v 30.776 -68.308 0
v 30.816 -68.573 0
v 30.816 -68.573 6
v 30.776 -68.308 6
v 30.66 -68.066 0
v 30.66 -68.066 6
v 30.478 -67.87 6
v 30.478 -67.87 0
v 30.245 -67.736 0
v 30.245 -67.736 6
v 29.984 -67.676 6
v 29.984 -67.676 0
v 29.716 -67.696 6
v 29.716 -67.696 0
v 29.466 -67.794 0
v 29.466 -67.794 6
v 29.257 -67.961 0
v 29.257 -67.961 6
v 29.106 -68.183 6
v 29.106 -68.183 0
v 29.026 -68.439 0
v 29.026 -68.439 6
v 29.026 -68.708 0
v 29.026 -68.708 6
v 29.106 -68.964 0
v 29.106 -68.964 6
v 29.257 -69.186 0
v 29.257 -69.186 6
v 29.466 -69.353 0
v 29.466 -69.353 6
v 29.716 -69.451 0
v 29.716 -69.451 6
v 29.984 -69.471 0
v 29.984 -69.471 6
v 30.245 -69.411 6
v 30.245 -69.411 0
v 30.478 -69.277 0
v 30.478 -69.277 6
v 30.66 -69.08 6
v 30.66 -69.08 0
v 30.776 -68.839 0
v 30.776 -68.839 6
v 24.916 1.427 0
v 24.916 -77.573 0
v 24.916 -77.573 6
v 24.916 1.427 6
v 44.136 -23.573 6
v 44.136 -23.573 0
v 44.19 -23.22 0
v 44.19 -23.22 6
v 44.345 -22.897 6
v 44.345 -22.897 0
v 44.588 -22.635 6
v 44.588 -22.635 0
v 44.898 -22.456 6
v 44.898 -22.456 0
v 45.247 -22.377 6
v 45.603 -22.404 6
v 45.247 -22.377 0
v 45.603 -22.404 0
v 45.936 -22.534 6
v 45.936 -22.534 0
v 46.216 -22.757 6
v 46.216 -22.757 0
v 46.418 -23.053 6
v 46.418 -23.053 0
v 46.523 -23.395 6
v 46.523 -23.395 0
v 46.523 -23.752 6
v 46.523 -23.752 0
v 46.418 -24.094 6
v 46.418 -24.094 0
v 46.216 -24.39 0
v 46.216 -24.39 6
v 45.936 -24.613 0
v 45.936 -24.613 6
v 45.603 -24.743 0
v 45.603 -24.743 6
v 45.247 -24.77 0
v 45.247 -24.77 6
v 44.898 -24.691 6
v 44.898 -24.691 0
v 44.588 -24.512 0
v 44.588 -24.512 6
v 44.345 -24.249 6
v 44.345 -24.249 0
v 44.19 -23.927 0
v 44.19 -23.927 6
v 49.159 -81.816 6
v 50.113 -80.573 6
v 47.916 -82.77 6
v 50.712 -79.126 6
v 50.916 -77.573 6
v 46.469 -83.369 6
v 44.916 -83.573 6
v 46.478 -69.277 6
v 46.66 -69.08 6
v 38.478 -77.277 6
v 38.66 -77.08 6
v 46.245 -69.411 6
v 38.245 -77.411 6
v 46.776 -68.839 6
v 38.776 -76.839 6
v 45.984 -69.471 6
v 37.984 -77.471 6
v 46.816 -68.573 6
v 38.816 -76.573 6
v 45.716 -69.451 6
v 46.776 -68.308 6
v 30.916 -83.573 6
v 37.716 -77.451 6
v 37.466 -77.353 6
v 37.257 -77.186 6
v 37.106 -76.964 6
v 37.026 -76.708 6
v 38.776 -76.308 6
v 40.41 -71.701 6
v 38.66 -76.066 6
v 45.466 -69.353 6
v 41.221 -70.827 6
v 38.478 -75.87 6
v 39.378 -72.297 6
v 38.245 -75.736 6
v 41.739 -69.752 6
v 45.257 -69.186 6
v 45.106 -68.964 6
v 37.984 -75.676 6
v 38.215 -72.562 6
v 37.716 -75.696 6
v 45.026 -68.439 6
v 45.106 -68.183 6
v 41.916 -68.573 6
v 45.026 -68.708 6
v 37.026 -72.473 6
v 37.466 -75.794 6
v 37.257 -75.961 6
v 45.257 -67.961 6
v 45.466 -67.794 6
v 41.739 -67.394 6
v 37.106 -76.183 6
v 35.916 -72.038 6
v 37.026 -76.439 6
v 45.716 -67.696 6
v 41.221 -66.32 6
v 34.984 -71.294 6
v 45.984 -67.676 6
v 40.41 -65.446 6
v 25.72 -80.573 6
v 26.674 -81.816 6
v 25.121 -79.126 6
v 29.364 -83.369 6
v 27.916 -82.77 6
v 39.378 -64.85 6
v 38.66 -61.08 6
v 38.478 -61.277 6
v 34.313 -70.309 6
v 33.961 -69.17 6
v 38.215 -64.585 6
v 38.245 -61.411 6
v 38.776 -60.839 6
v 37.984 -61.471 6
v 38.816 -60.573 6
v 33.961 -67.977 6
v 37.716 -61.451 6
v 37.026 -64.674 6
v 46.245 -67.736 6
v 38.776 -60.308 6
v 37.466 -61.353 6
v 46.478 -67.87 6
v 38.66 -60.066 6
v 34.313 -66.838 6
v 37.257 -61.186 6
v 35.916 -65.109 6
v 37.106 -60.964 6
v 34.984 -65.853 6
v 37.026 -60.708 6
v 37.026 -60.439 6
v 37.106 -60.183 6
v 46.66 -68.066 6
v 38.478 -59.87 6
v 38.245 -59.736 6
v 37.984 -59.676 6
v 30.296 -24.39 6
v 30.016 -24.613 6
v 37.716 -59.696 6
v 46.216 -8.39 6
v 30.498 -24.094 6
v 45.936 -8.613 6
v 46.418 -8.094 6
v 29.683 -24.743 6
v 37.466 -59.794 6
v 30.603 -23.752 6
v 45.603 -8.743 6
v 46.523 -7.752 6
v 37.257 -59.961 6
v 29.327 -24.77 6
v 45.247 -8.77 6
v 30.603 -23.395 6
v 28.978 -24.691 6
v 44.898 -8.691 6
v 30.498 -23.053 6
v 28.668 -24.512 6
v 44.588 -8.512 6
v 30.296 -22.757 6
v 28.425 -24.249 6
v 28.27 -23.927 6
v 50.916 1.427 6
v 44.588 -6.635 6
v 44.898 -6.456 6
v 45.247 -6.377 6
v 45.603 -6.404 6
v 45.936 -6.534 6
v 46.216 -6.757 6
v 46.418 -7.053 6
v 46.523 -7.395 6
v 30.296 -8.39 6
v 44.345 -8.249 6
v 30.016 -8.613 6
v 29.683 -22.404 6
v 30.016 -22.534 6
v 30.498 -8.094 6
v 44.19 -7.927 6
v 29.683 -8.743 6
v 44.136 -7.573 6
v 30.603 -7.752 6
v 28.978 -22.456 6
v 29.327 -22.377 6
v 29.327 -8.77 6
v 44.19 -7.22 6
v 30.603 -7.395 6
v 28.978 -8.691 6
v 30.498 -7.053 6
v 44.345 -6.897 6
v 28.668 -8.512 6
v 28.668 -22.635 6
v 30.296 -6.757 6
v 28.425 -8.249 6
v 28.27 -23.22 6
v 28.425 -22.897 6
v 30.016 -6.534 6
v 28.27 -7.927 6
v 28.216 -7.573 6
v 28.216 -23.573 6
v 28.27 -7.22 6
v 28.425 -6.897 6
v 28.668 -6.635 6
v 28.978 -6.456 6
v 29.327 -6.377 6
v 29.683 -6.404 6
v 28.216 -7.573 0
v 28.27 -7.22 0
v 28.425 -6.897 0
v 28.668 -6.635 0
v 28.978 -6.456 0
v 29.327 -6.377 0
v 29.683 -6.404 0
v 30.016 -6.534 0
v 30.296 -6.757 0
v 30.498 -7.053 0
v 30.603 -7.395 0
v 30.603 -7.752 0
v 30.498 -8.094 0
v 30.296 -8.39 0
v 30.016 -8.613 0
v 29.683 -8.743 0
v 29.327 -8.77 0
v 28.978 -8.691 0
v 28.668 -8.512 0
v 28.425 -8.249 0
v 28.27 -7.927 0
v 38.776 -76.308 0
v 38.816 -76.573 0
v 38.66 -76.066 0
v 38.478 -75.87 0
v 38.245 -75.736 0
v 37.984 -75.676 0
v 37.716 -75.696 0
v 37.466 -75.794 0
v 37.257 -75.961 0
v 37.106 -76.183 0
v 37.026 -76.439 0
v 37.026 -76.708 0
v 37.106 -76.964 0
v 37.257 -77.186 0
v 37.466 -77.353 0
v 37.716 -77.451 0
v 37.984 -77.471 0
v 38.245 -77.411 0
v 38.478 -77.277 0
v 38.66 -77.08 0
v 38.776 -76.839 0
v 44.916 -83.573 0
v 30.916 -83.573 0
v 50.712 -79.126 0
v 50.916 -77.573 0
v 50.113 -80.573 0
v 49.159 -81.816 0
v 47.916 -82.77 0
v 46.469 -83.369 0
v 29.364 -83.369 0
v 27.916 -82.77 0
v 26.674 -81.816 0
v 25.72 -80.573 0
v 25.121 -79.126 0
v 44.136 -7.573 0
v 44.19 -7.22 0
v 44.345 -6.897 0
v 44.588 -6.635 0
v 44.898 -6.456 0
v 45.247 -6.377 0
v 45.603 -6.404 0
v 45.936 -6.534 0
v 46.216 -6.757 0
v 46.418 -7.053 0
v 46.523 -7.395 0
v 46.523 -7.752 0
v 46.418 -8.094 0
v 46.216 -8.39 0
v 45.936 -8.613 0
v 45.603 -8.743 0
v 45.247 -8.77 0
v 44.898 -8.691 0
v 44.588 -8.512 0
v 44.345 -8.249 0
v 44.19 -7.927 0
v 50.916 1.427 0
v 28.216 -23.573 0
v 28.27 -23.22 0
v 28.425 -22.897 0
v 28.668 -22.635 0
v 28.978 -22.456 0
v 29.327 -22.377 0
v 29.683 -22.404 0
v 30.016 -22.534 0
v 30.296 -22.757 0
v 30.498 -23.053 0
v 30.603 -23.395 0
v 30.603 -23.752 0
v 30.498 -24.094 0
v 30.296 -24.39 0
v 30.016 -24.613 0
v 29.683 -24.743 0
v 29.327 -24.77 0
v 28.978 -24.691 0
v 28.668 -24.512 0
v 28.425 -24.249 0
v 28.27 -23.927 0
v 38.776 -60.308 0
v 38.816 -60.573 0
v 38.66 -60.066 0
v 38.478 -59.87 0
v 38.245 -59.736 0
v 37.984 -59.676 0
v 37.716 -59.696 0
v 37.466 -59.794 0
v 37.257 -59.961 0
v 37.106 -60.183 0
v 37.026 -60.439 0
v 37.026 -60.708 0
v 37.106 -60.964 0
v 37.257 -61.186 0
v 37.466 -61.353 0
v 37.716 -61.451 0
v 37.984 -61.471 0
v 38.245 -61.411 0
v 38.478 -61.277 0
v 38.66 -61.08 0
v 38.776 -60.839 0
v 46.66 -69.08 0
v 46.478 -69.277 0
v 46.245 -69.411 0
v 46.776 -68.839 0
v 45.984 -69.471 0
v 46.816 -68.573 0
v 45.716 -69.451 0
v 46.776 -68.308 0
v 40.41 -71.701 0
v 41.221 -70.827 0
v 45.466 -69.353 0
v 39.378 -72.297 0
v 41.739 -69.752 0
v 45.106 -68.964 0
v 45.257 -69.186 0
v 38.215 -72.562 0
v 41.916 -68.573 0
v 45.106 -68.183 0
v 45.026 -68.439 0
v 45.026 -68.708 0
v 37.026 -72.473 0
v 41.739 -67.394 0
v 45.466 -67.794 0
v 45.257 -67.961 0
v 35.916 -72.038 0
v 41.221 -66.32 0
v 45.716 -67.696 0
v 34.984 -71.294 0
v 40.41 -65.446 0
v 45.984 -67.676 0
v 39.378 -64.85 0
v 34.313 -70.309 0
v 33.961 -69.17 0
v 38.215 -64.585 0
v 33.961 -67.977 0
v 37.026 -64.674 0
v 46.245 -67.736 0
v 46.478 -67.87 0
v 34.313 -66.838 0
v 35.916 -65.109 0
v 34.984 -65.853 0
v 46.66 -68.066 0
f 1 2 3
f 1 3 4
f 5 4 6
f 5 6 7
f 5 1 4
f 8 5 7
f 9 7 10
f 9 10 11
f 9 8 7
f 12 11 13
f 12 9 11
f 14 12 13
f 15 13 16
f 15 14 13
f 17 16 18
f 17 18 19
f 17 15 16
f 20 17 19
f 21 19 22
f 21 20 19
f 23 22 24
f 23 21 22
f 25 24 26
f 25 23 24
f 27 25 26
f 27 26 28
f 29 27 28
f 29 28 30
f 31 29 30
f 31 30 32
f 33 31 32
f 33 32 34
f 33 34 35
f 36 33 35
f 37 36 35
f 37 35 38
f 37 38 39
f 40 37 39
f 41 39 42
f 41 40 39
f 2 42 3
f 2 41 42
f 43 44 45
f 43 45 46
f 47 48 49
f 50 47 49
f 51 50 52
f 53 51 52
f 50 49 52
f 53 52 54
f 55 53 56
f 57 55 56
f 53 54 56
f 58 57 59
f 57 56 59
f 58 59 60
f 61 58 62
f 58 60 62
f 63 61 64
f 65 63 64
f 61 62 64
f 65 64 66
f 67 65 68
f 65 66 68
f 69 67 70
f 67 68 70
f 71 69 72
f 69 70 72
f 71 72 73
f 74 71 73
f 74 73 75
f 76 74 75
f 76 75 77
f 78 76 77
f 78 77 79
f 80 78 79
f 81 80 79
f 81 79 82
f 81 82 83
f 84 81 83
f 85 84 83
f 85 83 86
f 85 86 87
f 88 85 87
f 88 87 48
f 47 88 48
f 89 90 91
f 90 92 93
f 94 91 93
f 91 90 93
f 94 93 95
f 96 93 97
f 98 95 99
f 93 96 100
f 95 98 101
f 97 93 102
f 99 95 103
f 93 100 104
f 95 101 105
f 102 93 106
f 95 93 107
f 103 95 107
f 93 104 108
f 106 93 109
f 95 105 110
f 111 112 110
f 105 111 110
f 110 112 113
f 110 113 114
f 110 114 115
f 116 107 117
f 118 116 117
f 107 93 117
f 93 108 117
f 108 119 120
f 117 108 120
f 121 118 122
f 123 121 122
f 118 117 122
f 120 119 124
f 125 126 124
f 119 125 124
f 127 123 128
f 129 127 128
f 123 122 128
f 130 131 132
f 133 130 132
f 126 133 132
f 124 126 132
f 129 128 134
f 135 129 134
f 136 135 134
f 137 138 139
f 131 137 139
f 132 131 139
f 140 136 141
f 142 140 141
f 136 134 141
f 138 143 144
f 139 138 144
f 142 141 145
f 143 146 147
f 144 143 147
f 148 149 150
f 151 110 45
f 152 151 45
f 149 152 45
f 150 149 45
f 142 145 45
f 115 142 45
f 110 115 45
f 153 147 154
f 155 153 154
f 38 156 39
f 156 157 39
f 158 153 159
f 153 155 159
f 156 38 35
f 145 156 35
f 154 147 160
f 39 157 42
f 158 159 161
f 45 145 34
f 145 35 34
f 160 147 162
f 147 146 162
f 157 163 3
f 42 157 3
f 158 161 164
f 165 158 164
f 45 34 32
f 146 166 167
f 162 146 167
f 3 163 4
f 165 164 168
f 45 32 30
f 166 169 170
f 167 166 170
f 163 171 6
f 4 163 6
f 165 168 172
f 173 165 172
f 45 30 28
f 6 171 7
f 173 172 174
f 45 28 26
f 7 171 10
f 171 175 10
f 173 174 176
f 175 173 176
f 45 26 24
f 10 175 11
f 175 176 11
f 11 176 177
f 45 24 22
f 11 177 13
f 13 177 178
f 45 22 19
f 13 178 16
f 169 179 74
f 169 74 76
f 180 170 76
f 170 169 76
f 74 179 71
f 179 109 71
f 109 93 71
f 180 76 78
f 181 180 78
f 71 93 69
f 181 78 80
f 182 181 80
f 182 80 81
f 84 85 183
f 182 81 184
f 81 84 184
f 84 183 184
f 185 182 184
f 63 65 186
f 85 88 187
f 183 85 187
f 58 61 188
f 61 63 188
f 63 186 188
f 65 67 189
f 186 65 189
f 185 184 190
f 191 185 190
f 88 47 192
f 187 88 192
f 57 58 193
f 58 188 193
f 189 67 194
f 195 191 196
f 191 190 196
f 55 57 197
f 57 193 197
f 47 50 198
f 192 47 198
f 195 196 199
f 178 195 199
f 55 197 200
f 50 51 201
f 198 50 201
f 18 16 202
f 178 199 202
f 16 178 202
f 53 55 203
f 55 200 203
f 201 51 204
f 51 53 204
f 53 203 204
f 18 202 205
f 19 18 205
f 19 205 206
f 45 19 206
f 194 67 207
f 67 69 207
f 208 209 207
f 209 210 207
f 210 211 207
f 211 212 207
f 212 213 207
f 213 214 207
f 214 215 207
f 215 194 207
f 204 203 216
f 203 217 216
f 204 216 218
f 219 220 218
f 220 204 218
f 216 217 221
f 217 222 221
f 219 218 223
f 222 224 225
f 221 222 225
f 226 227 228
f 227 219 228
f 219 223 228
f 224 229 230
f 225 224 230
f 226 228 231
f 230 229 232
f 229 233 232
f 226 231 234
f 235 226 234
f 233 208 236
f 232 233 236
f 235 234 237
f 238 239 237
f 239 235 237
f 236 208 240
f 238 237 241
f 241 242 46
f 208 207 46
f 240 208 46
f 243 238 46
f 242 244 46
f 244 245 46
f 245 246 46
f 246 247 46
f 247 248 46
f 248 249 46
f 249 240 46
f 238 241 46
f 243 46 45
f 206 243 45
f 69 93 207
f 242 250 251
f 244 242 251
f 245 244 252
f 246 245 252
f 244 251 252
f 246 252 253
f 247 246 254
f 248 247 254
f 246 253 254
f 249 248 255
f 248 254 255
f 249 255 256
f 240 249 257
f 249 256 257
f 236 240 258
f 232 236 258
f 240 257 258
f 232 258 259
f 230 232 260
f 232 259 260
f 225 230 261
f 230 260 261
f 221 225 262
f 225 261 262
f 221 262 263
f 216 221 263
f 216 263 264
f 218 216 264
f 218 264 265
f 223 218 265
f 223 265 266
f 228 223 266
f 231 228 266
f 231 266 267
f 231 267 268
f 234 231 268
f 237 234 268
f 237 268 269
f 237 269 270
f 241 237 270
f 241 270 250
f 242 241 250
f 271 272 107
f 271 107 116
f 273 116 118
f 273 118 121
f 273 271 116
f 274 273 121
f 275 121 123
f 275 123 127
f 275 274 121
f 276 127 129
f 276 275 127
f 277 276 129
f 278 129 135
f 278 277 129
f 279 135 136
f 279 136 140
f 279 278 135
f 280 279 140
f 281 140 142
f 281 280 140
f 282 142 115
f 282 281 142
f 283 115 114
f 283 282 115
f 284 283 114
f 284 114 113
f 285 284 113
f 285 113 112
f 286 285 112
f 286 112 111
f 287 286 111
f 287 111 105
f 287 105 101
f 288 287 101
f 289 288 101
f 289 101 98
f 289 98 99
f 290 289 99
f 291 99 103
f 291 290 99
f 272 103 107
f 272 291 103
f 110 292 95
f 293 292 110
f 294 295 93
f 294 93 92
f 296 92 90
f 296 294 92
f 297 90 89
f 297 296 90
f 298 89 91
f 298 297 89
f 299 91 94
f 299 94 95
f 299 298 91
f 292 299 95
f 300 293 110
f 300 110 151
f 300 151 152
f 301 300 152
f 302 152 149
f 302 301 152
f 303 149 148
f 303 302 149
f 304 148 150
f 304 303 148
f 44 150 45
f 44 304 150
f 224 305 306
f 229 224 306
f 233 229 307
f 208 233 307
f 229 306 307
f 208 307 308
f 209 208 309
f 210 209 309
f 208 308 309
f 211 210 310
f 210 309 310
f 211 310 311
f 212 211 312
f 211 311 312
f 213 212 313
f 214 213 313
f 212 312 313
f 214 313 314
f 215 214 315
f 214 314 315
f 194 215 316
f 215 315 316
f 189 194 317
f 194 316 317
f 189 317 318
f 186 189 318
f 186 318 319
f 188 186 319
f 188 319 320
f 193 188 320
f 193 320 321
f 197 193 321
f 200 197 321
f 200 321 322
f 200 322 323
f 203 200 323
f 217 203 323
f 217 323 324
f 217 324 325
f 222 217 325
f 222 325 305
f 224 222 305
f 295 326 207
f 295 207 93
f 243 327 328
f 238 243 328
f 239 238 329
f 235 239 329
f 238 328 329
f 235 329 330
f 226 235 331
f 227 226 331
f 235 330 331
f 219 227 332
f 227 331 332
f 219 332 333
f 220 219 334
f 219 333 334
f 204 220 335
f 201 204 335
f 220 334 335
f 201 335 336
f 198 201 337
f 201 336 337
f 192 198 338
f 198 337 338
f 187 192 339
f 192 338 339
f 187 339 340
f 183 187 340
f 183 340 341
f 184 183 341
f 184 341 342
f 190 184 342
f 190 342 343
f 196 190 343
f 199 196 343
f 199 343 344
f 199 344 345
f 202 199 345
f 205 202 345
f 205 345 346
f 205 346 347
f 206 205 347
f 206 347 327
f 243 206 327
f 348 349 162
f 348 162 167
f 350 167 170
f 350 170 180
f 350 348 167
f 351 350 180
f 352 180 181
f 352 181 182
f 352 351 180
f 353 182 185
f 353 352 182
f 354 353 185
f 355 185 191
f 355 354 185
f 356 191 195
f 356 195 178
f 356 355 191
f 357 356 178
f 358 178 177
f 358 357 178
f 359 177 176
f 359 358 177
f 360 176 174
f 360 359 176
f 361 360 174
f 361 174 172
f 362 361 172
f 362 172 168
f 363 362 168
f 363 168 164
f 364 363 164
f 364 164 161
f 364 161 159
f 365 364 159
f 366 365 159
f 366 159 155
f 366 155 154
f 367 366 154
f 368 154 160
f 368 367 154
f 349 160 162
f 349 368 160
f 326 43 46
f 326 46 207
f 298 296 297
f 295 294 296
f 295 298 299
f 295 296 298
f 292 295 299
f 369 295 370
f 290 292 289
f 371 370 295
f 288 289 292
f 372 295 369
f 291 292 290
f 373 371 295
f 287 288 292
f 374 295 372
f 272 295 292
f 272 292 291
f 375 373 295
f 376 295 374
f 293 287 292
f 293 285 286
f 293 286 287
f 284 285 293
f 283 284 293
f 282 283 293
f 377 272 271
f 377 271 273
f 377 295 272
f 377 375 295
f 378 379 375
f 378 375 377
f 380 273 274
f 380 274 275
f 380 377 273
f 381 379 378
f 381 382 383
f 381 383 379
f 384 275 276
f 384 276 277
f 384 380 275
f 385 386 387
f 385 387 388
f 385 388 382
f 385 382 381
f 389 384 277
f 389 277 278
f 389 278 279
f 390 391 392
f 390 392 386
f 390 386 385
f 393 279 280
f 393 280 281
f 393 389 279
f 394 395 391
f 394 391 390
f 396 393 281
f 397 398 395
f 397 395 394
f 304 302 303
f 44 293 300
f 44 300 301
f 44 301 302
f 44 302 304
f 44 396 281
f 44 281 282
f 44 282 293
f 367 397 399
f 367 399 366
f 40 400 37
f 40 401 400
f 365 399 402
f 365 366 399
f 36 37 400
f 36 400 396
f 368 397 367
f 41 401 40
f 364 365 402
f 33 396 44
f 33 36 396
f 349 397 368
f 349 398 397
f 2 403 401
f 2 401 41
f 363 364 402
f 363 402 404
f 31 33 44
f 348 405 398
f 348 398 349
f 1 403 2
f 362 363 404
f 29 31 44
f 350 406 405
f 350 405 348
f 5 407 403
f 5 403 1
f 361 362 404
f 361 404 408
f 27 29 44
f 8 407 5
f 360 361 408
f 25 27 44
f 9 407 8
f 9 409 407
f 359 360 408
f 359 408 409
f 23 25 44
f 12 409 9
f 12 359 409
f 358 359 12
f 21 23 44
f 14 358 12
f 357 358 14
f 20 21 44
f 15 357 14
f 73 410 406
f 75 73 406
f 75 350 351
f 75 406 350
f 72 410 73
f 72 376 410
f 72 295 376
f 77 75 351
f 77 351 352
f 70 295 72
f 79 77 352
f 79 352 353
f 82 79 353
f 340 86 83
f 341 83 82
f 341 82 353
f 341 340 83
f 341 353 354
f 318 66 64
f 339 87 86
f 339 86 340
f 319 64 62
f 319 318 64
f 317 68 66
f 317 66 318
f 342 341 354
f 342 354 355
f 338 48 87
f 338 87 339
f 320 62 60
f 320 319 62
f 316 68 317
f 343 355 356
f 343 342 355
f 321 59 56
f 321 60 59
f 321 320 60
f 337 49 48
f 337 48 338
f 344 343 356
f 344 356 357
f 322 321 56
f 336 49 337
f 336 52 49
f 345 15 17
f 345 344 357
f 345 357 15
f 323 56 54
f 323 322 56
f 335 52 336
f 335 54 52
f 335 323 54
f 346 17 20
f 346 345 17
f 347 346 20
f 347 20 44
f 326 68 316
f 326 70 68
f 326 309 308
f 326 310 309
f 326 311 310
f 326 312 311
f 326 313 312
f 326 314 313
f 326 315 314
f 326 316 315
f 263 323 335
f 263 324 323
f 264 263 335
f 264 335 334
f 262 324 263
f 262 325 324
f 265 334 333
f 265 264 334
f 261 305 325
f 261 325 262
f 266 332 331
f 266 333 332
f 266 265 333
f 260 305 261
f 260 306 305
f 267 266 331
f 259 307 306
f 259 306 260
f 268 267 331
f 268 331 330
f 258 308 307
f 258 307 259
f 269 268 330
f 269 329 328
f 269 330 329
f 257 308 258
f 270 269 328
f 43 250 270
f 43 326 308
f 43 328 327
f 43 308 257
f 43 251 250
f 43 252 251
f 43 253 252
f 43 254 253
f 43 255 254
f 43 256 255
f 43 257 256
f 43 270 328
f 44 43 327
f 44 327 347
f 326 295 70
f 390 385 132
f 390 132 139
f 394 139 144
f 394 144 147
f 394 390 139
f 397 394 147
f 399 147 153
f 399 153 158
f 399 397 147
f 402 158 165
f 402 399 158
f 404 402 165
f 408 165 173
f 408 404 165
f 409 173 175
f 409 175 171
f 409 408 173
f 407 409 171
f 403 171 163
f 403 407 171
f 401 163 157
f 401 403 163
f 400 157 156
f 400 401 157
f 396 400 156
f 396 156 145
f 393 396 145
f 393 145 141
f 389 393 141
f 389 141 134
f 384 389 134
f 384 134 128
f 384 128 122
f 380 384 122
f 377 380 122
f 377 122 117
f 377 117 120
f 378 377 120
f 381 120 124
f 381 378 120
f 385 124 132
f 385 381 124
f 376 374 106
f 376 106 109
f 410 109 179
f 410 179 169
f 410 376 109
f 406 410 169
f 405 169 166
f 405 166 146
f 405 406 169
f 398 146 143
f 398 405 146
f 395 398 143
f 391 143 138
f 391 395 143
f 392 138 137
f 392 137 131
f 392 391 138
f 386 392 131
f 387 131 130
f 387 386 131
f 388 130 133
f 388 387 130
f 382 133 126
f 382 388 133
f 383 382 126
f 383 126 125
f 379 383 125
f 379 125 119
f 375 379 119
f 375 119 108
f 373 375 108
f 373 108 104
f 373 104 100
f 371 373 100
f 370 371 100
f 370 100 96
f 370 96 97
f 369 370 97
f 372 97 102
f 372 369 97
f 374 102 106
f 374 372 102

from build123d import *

# Parameters (mm, degrees)
ESQUISSE1_R             = 0.9
ESQUISSE1_R_2           = 4
BOSS_EXTRU_1_DEPTH      = 6
ESQUISSE2_R             = 1.2
ENL_V_MAT_EXTRU_1_DEPTH = 10


with BuildPart() as part:
    # Esquisse1 → Boss.-Extru.1 (new body)
    with BuildSketch(Plane.XY):
        with BuildLine():
            Line((24.916434397, -77.573457495), (24.916434397, 1.426542505))
            Line((24.916434397, 1.426542505), (50.916434397, 1.426542505))
            Line((50.916434397, 1.426542505), (50.916434397, -77.573457495))
            ThreePointArc((50.916434397, -77.573457495), (49.159075085, -81.816098182), (44.916434397, -83.573457495))
            Line((44.916434397, -83.573457495), (30.916434397, -83.573457495))
            ThreePointArc((30.916434397, -83.573457495), (26.67379371, -81.816098182), (24.916434397, -77.573457495))
        make_face()
        with Locations((29.916434397, -68.573457495)):
            Circle(ESQUISSE1_R, mode=Mode.SUBTRACT)
        with Locations((37.916434397, -60.573457495)):
            Circle(ESQUISSE1_R, mode=Mode.SUBTRACT)
        with Locations((45.916434397, -68.573457495)):
            Circle(ESQUISSE1_R, mode=Mode.SUBTRACT)
        with Locations((37.916434397, -76.573457495)):
            Circle(ESQUISSE1_R, mode=Mode.SUBTRACT)
        with Locations((37.916434397, -68.573457495)):
            Circle(ESQUISSE1_R_2, mode=Mode.SUBTRACT)
    extrude(amount=BOSS_EXTRU_1_DEPTH)

    # Esquisse2 → Enlèv. mat.-Extru.1 (cut)
    with BuildSketch(Plane(origin=(0, 0, 0), x_dir=(-1, 0, 0), z_dir=(0, 0, -1))):
        with Locations((-45.336434397, -7.573457495)):
            Circle(ESQUISSE2_R)
        with Locations((-29.416434397, -7.573457495)):
            Circle(ESQUISSE2_R)
        with Locations((-45.336434397, -23.573457495)):
            Circle(ESQUISSE2_R)
        with Locations((-29.416434397, -23.573457495)):
            Circle(ESQUISSE2_R)
    extrude(amount=-ENL_V_MAT_EXTRU_1_DEPTH, mode=Mode.SUBTRACT)


solid = part.part
